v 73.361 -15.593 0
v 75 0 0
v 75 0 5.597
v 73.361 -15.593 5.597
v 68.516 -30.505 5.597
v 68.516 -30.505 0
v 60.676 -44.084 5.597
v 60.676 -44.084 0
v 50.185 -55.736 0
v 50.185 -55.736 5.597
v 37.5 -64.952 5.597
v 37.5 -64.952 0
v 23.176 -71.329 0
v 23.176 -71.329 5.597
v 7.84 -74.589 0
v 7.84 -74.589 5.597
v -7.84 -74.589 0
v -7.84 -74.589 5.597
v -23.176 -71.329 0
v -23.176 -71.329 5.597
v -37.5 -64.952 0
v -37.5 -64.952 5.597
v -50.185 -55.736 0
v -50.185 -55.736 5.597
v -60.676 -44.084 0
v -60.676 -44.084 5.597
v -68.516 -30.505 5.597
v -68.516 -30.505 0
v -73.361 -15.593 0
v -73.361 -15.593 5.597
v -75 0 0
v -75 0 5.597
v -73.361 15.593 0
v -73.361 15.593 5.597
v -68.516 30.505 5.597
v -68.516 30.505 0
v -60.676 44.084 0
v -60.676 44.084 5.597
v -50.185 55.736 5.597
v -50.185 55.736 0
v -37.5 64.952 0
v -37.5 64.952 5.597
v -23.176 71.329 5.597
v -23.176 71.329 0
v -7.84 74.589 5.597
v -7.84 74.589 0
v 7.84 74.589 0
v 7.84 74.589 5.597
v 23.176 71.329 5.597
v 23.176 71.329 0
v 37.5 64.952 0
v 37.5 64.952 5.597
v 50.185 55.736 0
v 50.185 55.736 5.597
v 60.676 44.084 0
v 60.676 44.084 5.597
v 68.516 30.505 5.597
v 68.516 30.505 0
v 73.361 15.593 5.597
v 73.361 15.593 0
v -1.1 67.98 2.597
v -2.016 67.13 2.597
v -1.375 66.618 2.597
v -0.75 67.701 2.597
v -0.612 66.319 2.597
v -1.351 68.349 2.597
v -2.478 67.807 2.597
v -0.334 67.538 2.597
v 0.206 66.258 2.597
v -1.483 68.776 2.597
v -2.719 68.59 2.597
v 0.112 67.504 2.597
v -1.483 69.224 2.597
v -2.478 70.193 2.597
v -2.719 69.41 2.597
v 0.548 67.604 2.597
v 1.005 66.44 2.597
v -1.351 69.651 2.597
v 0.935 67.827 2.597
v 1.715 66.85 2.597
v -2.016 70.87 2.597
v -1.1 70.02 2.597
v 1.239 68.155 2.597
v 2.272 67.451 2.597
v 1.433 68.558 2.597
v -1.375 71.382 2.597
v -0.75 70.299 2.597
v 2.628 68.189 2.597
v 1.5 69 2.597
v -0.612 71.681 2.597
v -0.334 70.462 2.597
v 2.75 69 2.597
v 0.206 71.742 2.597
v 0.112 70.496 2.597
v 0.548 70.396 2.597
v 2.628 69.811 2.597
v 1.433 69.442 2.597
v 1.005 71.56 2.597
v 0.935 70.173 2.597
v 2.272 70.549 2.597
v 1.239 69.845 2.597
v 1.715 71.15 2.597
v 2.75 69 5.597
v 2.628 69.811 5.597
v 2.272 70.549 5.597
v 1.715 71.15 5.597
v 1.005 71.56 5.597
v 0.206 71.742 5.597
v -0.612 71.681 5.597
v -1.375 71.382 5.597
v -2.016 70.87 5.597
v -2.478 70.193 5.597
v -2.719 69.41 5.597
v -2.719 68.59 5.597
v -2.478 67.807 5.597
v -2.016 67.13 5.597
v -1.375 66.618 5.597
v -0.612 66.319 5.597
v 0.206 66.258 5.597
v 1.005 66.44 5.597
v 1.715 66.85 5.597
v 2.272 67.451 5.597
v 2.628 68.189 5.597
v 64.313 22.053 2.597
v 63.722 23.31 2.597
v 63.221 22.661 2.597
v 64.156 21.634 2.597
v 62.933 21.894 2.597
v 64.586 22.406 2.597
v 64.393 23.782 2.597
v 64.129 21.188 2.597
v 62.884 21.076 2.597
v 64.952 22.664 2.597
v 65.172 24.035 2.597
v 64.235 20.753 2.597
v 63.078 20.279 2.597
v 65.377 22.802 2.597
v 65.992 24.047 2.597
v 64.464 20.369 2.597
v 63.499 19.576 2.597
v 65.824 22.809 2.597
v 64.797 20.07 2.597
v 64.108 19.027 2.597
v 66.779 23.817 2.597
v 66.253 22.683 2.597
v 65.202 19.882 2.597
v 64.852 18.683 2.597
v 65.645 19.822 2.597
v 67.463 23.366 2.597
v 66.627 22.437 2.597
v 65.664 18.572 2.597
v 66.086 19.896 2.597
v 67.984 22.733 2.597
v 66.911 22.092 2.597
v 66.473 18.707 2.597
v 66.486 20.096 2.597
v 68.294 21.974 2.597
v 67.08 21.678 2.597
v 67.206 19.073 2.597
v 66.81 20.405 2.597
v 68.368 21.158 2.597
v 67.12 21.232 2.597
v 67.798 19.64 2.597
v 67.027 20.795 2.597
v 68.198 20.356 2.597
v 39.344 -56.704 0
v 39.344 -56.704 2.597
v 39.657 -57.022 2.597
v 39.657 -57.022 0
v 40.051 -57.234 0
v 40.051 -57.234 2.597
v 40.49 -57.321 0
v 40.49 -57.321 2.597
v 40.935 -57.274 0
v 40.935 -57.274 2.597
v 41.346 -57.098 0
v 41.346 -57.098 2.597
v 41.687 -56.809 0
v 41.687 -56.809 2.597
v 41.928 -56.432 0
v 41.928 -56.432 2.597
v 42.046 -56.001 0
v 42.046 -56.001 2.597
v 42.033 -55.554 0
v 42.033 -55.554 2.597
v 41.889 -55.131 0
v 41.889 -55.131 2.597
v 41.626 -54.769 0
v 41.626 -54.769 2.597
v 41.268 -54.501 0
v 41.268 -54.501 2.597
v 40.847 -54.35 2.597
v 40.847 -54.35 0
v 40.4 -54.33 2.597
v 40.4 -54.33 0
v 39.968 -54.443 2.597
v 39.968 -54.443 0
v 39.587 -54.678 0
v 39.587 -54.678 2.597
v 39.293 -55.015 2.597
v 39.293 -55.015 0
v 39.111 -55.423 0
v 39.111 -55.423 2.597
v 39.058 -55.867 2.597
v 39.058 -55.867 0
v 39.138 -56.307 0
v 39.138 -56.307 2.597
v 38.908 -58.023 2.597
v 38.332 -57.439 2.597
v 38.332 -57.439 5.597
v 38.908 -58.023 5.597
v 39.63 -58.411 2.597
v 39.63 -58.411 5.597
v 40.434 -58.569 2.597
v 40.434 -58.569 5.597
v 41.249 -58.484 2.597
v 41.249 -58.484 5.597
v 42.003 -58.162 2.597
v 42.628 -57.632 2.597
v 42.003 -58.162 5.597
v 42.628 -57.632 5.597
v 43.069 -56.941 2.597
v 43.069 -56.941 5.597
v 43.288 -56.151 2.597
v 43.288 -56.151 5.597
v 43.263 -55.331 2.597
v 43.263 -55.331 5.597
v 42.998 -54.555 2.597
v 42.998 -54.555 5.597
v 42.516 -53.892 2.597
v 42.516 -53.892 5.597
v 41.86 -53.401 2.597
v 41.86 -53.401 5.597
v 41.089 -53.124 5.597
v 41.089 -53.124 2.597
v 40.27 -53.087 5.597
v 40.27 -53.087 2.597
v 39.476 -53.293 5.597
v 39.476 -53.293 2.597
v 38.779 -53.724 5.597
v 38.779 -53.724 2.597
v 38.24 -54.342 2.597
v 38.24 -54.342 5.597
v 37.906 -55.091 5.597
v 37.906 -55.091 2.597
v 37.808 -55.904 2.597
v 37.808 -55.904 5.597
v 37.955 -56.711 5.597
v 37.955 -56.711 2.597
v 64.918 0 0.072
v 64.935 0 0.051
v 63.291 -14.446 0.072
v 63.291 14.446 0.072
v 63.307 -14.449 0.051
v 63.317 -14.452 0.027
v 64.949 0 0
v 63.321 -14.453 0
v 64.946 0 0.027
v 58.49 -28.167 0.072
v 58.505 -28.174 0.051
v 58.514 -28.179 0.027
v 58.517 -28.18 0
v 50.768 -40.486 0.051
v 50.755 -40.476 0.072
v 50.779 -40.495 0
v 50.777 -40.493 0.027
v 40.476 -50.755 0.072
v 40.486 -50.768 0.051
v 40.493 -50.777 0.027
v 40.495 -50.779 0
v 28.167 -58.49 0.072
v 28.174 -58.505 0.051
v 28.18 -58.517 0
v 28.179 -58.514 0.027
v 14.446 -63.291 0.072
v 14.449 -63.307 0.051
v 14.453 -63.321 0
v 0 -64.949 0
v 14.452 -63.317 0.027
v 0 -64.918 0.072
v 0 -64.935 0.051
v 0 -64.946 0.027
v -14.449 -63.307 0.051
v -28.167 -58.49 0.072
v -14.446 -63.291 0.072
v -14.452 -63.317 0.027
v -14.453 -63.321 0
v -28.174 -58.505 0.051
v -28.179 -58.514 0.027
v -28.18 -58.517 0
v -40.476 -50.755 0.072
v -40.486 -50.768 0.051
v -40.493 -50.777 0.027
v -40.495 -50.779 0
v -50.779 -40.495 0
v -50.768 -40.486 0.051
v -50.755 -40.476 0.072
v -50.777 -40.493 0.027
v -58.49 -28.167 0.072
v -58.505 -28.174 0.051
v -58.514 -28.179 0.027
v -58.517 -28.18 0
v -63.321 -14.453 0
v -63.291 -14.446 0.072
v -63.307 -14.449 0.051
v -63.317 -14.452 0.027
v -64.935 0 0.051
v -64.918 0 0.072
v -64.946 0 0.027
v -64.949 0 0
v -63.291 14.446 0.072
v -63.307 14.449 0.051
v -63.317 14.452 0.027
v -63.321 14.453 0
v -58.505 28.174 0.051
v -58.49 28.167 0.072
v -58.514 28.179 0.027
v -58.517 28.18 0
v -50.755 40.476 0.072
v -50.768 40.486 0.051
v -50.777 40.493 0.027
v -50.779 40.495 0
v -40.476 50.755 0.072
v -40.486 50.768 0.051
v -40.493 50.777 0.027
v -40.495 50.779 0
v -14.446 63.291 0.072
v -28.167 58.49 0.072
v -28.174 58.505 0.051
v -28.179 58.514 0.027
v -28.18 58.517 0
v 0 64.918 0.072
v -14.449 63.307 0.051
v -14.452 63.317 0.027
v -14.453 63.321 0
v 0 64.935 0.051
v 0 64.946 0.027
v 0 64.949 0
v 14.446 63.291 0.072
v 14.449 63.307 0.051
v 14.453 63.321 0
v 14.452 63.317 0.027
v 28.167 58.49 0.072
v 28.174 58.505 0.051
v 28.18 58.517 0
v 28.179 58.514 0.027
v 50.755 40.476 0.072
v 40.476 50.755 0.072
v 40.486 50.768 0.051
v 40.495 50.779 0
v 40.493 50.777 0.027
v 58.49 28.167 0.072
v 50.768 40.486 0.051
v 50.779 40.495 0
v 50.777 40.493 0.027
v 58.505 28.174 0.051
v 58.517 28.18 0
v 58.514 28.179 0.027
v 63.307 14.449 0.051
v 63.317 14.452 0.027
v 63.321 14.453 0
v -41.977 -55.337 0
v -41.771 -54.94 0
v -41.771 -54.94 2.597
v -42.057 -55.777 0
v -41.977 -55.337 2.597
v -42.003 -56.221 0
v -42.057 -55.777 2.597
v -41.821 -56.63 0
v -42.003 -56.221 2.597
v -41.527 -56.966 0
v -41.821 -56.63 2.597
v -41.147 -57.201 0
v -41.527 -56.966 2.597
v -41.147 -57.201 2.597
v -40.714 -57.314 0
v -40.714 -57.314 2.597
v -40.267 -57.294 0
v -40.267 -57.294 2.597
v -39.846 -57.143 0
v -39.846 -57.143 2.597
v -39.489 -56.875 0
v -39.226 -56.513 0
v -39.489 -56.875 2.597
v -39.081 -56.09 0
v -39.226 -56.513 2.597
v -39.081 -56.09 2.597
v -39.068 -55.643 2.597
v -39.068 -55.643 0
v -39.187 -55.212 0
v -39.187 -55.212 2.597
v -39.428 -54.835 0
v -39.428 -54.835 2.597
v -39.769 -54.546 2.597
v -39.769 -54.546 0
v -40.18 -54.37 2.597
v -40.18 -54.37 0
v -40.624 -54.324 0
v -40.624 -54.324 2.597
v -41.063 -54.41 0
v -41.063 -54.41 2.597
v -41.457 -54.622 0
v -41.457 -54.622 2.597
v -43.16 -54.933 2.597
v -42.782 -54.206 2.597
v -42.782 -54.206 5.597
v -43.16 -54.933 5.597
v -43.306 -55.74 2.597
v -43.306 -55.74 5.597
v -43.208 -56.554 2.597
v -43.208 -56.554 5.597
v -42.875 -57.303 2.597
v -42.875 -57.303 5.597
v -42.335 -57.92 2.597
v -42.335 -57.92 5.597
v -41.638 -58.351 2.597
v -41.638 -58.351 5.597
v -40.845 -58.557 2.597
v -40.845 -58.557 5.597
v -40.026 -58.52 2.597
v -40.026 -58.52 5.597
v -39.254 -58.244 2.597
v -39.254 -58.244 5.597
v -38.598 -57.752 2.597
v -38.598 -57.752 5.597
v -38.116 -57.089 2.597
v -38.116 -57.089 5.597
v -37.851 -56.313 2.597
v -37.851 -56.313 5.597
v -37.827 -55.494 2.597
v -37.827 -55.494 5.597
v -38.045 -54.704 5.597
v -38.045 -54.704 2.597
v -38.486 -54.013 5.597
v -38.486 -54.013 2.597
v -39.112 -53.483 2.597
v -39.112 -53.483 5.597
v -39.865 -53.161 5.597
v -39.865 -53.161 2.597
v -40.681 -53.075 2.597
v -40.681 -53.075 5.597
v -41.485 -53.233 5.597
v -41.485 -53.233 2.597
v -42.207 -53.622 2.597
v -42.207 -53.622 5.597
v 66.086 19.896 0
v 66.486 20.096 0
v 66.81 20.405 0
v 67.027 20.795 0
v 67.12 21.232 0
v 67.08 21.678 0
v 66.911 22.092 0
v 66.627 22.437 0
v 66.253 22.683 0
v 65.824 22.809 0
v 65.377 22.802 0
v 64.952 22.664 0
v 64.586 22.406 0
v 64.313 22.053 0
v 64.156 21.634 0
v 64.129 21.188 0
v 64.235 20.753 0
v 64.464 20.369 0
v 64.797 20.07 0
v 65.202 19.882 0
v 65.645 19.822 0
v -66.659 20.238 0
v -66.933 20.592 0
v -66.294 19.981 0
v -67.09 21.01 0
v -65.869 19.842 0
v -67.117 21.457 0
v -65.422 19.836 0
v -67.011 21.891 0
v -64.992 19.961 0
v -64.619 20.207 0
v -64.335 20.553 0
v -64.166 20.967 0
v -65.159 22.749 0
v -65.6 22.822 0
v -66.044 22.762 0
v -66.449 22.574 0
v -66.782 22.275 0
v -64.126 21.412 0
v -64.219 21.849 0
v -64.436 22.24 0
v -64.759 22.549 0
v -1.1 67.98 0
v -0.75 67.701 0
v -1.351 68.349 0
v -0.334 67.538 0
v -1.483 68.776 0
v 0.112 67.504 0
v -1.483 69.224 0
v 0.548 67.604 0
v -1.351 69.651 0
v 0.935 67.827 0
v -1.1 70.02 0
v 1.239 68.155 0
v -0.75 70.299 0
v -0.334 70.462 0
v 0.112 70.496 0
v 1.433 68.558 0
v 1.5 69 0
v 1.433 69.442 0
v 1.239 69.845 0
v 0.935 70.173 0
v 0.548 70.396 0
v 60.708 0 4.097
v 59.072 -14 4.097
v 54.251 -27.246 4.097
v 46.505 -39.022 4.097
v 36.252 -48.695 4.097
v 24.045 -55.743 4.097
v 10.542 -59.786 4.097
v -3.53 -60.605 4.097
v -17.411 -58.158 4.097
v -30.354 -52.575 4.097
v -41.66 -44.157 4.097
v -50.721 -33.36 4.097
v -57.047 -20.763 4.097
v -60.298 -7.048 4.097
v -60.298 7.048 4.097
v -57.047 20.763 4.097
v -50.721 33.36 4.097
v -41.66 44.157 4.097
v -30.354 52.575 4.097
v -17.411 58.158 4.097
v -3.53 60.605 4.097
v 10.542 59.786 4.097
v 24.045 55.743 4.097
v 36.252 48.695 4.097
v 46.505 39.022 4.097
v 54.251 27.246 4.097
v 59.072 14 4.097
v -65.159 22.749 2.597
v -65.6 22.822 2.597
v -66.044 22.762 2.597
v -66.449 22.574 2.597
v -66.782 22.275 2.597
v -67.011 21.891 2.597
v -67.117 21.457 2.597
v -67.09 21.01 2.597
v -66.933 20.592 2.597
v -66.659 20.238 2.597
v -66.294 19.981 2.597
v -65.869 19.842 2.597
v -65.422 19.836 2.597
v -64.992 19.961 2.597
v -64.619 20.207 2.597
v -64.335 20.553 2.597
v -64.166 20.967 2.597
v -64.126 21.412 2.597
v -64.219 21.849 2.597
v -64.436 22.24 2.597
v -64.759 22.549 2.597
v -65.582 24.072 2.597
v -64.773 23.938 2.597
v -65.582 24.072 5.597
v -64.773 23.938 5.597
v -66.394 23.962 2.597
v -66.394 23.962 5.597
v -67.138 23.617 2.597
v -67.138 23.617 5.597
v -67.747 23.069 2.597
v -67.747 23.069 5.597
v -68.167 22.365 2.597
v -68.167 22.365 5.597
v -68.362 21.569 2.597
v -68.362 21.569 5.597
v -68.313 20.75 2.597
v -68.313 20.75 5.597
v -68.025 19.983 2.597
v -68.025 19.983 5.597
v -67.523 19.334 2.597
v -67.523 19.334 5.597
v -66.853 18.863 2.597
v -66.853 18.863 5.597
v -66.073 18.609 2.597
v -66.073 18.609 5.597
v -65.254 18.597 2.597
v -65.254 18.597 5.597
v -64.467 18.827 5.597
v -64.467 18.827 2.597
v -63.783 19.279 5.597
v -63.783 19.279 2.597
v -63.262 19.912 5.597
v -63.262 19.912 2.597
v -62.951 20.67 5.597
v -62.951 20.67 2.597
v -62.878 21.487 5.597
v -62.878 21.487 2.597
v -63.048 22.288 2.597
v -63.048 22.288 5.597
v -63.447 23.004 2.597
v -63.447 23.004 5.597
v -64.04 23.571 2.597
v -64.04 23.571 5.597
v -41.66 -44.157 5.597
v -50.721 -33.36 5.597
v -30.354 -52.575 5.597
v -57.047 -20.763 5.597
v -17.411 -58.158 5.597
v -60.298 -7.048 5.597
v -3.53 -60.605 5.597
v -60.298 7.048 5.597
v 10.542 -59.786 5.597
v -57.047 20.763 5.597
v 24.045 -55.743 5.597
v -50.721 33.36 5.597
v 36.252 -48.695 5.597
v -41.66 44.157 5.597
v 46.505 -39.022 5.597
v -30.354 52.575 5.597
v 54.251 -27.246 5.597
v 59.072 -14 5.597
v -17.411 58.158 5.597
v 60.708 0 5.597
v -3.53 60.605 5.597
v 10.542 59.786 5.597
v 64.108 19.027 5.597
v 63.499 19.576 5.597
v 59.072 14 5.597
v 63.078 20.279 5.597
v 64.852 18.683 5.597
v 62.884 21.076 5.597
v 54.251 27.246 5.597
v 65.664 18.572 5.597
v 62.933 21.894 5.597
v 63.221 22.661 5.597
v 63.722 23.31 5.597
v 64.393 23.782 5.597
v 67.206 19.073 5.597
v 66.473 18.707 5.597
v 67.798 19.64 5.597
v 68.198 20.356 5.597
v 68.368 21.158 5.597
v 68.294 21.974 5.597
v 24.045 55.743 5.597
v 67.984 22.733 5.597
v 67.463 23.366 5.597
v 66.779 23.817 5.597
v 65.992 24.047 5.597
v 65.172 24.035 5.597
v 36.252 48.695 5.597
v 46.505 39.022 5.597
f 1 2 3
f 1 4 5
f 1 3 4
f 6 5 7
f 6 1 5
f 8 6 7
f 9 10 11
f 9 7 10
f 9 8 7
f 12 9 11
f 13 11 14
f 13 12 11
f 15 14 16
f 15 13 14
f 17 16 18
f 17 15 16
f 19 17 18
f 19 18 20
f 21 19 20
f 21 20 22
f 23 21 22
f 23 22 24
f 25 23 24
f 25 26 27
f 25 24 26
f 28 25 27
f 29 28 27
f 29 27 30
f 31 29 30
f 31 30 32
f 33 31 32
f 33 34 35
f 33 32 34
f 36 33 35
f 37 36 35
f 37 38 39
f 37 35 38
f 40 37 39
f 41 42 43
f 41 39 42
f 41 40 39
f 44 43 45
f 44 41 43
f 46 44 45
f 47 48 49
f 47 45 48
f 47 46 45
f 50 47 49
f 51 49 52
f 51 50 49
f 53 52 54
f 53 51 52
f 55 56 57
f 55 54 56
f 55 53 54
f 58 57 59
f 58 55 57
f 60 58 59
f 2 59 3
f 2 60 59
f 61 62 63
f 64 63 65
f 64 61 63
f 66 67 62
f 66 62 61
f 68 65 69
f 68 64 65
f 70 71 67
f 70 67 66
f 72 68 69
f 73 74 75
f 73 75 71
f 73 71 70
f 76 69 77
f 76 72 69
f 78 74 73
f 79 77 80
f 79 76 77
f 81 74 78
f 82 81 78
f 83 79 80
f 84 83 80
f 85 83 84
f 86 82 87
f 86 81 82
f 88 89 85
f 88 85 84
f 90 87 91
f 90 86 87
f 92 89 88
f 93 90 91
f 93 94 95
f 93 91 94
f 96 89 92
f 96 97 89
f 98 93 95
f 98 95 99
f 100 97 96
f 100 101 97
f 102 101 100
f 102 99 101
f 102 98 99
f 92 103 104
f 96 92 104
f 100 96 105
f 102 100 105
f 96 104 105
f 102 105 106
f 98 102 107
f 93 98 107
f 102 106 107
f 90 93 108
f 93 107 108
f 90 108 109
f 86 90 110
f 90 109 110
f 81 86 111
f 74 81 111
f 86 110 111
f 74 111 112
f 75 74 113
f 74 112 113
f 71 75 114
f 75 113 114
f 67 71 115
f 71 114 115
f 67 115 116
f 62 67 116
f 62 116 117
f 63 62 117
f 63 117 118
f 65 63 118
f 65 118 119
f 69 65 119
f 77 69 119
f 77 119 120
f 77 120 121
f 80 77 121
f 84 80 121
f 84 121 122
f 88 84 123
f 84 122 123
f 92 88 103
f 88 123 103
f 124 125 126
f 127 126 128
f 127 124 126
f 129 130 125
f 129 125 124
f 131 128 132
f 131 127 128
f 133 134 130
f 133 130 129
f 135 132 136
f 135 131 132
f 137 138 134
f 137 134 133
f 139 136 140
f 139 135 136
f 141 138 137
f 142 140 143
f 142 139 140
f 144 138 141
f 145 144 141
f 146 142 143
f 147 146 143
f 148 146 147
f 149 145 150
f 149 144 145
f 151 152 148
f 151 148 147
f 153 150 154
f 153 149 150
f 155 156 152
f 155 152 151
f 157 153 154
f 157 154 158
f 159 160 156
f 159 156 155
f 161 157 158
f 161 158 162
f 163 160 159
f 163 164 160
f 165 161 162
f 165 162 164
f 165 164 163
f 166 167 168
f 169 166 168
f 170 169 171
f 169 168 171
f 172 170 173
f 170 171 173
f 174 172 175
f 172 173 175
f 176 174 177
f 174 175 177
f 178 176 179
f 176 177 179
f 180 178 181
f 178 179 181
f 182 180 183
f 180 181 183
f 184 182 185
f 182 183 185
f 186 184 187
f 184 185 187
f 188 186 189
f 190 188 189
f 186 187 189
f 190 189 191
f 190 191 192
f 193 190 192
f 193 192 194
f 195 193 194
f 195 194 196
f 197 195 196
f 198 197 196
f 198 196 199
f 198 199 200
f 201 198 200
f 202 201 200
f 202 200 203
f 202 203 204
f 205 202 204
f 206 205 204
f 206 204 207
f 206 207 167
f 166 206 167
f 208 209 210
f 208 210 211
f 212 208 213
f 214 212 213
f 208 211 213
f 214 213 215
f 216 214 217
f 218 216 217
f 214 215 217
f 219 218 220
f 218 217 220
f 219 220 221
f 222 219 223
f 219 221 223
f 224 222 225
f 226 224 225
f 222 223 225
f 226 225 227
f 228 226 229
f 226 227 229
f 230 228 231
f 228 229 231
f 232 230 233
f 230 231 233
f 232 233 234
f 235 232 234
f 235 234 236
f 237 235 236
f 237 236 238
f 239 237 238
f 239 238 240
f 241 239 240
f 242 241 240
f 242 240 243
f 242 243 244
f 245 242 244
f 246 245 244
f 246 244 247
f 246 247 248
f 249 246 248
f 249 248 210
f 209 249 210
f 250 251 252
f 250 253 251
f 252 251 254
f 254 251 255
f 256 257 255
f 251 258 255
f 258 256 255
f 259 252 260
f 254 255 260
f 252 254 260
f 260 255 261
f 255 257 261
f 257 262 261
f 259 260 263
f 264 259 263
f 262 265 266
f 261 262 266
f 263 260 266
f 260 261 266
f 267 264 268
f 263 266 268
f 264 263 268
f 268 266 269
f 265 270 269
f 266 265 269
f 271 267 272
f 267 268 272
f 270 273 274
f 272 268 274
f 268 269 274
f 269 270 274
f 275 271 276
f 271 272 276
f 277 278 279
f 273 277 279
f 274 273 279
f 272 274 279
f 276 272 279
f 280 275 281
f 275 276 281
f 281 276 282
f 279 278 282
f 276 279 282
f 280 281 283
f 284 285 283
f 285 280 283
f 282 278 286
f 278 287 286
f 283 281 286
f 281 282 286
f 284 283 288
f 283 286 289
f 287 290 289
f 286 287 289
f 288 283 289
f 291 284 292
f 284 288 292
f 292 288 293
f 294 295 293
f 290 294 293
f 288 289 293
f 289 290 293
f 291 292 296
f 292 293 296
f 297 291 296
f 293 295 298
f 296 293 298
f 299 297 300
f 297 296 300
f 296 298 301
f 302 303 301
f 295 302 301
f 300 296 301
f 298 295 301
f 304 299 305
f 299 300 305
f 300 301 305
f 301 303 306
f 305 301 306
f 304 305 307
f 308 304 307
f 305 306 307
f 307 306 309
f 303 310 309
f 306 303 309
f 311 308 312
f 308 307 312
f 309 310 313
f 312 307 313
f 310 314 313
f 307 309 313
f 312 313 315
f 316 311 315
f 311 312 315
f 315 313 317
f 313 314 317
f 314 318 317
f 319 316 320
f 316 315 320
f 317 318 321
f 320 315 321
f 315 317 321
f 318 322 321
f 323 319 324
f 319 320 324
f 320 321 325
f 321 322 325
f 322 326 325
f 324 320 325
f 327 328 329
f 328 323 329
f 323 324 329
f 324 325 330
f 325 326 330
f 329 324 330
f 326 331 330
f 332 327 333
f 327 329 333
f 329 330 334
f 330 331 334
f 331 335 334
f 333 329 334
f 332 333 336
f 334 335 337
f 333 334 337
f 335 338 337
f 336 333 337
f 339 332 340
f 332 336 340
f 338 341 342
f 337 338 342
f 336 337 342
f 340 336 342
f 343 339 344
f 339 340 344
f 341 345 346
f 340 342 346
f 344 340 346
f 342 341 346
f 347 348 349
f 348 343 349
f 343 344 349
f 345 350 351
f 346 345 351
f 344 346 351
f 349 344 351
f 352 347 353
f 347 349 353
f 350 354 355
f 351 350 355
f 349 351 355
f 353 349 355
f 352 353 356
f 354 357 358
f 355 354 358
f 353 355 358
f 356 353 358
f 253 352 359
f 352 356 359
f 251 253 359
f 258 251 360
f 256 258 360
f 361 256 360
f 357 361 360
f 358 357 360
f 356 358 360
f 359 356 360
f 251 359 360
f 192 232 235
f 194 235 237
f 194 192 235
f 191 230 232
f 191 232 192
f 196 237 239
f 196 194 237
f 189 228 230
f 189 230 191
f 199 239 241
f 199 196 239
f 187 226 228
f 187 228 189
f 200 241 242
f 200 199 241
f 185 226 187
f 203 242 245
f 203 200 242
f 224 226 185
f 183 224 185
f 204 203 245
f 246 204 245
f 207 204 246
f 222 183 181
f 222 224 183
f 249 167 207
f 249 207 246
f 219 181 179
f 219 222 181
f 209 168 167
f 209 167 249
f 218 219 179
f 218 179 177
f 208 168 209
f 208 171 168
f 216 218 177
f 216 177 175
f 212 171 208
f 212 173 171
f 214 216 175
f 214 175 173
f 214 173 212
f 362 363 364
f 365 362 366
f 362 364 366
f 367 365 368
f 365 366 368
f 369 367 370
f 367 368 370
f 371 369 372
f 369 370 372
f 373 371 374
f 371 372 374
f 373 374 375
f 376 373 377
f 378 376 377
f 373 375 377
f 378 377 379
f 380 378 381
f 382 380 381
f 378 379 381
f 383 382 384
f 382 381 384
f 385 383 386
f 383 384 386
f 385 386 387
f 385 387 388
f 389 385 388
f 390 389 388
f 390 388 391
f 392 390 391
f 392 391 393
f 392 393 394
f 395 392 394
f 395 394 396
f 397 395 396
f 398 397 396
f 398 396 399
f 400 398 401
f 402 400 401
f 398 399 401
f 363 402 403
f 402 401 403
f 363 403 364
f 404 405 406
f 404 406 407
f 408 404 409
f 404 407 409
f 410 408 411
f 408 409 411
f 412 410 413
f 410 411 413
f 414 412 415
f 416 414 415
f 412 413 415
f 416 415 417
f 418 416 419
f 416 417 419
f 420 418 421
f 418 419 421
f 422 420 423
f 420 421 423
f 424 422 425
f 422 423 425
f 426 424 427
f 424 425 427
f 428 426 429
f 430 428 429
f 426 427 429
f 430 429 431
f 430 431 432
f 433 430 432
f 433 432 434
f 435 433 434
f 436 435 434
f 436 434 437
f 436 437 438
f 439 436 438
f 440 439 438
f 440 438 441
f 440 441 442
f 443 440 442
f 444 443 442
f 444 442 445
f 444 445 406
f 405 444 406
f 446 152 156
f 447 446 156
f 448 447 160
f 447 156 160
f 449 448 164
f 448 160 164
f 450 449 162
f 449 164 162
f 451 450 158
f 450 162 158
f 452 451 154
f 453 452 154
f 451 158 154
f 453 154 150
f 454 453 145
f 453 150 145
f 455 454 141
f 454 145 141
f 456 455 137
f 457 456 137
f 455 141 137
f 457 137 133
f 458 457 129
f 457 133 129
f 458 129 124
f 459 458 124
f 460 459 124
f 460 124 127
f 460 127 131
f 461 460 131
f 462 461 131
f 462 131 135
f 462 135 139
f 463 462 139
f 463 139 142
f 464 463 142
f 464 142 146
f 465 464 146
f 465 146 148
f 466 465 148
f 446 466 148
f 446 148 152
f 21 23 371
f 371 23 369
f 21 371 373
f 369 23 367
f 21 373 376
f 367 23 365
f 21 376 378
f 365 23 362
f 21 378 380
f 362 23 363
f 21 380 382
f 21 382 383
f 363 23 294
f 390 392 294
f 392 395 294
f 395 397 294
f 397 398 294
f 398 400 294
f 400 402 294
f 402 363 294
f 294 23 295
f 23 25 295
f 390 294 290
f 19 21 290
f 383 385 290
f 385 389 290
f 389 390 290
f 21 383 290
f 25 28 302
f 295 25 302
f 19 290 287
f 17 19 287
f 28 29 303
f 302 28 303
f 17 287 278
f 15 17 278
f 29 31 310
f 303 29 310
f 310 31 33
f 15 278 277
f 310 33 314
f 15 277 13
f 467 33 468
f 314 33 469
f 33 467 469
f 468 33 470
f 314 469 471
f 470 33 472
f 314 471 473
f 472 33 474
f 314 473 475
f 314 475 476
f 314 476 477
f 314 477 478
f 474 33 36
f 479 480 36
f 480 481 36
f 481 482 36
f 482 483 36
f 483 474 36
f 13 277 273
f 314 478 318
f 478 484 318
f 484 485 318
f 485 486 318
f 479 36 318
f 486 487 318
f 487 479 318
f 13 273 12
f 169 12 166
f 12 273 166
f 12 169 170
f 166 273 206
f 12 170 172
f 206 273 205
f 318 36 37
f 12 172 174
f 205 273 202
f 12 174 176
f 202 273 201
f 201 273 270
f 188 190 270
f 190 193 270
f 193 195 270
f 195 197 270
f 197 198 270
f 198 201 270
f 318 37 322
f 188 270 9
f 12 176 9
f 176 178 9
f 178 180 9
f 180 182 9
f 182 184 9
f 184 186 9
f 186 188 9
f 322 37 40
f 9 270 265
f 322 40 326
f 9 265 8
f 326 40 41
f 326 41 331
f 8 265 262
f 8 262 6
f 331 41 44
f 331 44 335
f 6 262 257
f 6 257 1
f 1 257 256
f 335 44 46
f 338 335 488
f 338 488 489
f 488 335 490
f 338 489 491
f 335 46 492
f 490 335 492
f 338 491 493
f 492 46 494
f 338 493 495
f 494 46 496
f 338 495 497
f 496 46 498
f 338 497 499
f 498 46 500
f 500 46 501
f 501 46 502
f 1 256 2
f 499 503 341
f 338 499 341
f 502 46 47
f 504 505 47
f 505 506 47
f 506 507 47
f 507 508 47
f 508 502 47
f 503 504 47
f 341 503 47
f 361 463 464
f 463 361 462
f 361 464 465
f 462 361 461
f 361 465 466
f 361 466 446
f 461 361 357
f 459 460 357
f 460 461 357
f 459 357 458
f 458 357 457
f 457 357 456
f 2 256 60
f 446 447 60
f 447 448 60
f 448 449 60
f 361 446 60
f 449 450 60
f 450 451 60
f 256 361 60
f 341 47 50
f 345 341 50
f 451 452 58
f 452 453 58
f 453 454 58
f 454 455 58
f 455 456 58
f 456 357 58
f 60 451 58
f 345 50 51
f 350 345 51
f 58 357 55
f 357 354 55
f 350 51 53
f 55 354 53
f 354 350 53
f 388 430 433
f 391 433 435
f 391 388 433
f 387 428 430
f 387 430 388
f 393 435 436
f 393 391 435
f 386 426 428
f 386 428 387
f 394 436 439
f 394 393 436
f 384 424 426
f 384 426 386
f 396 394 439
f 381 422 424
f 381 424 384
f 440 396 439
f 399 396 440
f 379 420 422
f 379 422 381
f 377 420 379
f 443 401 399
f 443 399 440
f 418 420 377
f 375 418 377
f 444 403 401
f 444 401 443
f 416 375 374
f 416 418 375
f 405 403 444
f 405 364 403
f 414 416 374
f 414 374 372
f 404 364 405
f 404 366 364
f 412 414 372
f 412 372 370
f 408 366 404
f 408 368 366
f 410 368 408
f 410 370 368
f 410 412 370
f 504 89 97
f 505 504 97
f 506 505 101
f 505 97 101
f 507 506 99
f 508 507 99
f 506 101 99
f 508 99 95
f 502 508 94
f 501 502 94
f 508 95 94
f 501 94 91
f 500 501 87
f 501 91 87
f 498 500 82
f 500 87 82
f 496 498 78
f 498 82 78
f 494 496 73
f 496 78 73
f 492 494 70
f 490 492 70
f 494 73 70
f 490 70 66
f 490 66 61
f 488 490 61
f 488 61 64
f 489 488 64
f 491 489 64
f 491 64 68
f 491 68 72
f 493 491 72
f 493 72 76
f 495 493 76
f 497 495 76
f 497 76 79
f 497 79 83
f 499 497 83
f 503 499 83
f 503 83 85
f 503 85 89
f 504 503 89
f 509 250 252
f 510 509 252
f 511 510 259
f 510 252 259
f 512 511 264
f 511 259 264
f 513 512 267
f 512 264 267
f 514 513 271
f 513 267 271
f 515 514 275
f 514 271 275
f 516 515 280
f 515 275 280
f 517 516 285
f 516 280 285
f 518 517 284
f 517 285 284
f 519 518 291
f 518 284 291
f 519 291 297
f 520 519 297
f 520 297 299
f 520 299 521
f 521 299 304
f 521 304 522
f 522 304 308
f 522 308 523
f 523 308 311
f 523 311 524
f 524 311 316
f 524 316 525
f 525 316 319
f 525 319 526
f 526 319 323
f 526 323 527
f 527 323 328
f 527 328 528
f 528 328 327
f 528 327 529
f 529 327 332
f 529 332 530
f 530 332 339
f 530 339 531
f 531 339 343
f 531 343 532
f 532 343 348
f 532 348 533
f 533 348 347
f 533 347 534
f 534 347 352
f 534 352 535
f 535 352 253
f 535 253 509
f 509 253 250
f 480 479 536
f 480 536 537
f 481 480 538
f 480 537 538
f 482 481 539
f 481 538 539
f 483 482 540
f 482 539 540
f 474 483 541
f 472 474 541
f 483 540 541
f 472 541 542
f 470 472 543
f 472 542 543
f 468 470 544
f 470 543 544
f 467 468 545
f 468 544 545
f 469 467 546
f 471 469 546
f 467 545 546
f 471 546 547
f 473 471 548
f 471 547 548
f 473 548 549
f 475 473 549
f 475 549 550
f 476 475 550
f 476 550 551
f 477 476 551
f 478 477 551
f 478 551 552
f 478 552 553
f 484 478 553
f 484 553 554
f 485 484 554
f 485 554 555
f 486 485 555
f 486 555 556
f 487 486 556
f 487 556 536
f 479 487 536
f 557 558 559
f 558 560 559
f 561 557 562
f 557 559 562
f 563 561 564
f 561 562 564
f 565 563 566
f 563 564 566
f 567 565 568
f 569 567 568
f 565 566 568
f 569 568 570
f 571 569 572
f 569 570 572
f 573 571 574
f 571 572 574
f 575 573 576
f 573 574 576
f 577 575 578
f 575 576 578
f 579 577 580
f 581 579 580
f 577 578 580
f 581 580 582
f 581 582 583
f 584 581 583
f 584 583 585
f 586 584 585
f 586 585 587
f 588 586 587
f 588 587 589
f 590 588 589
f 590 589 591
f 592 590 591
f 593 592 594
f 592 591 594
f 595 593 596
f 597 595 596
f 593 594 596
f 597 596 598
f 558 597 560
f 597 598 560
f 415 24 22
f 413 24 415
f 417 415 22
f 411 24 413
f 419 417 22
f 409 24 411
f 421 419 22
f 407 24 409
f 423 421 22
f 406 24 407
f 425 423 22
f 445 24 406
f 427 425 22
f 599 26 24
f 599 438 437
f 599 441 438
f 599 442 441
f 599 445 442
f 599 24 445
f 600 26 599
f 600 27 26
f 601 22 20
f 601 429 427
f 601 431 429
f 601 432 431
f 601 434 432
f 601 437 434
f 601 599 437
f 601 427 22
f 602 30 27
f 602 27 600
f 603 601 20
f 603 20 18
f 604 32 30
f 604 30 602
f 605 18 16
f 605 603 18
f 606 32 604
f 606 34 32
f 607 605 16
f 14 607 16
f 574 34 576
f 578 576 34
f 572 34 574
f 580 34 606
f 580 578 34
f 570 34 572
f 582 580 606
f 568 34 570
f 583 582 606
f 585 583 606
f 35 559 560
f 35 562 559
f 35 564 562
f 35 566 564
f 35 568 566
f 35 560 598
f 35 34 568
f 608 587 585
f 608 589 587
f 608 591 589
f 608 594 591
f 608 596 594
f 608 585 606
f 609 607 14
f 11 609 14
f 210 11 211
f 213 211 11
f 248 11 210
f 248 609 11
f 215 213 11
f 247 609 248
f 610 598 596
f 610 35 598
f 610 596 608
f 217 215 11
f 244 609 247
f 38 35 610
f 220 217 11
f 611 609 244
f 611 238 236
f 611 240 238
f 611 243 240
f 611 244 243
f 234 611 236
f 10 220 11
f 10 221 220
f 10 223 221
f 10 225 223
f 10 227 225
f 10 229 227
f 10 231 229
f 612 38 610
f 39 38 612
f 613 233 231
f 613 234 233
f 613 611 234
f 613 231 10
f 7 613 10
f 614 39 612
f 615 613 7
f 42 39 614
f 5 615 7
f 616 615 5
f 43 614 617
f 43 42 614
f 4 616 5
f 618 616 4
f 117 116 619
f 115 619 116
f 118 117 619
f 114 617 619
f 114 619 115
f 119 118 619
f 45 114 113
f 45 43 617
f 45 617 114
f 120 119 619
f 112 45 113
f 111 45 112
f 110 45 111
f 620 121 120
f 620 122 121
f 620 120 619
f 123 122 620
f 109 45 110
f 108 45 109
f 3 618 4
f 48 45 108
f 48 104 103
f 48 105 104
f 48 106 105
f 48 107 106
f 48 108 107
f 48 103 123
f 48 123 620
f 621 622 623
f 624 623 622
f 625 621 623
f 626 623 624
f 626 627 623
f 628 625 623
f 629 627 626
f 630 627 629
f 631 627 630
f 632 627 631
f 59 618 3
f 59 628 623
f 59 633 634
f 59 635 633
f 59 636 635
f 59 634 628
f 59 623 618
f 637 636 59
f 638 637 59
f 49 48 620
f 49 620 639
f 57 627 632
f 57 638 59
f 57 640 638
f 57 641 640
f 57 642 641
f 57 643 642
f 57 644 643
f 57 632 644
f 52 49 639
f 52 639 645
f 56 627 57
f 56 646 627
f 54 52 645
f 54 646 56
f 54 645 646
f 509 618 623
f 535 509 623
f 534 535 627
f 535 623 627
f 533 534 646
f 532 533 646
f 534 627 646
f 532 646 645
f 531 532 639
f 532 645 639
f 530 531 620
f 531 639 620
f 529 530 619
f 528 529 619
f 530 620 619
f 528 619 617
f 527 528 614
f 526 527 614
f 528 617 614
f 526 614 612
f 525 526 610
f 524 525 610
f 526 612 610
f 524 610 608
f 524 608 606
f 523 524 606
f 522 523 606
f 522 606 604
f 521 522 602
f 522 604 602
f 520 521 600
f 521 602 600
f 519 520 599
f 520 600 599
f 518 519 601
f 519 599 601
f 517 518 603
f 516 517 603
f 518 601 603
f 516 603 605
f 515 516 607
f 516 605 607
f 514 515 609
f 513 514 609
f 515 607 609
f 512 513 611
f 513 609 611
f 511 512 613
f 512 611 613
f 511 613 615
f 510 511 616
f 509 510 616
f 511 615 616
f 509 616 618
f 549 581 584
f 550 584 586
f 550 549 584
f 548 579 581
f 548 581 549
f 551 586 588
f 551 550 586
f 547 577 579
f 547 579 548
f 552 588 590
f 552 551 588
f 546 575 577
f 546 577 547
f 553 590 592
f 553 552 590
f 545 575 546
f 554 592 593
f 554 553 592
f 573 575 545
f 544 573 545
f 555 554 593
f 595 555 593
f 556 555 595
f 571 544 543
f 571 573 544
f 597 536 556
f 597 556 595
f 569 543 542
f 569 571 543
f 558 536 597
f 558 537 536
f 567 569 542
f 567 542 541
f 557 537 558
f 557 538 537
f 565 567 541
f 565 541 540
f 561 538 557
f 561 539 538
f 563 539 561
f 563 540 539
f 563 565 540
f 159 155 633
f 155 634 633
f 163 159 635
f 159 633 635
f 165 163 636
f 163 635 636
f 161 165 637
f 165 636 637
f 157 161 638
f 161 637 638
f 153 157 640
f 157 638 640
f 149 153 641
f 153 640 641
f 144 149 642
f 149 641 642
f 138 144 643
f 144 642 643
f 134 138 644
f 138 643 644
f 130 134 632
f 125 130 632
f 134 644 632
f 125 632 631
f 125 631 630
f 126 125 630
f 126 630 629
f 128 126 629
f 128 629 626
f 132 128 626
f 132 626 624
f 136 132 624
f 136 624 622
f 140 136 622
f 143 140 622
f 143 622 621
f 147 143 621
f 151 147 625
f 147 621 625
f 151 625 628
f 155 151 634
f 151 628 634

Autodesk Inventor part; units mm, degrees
ref_plane "YZ Plane" through (0, 0, 0) normal (1, 0, 0) x (0, 1, 0)
ref_plane "XZ Plane" through (0, 0, 0) normal (0, 1, 0) x (-1, 0, 0)
sketch "Sketch7" plane through (0, 0, 0) normal (0, 1, 0) x (-1, 0, 0)
  line L0 (0, 0) -> (0, 61.9844)
  line L1 (0, 0) -> (-59.2469, 0) construction
  line L2 (0, 61.9844) -> (-59.2469, 0) construction
  line L3 (0, 61.9844) -> (-64.8494, 0) construction
  line L4 (0, 61.9844) -> (-58.9939, -5.5968) construction
  line L5 (0, 0) -> (0, -61.9844)
  line L6 (0, -61.9844) -> (-59.2469, 0) construction
  line L7 (0, -61.9844) -> (-64.8494, 0) construction
  line L8 (0, -61.9844) -> (-58.9939, 5.5968) construction
  line L9 (-58.9939, 5.5968) -> (-64.8494, 0) construction
  line L10 (-54.1083, 0) -> (-62.8579, -8.363) construction
  line L11 (-54.1083, 0) -> (-38.773, -14.6578) construction
  line L12 (0, -94.3812) -> (0, 132.3969) projected
  line L13 (-75, -5.9919) -> (-75, 6.008)
  line L14 (105, 0) -> (-105, 0) projected
  line L15 (-62.0481, 2.6775) -> (-56.4456, -2.6775) construction
  line L16 (-56.4456, 2.6775) -> (-62.0481, -2.6775) construction
  line L17 (-26.151, -15.9303) -> (-40.3783, -15.9303) construction
  line L18 (-40.3783, -15.9303) -> (-40.3783, -12.7539) construction
  line L19 (-40.3783, -12.7539) -> (-26.151, -12.7539) construction
  line L20 (-26.151, -12.7539) -> (-26.151, -15.9303) construction
  point P0 (-75, 0)
  dimension "Roller_Side_difference" = -0.0002
  dimension "d90" = 61.9844
  dimension "d201" = 75
  dimension "d343" = 92.587
  dimension "d344" = 92.588
  dimension "d367" = 8.1
sketch "Sketch1" plane through (0, 0, 0) normal (0, 0, 1) x (1, 0, 0)
  circle A0 centre (0, 0) radius 59.2469 construction
  line L0 (0, 0) -> (59.2469, 0)
  line L1 (0, 0) -> (59.2469, 4.025)
  line L2 (59.2469, 0) -> (59.2469, 4.025)
  circle A1 centre (0, 0) radius 75
  point P0 (56.8, 0)
  dimension "d56" = 59.2469
  dimension "d57" = 4.025
  dimension "d400" = 75
  dimension "d495" = 2.5
  dimension "d496" = 8
  dimension "d531" = 5.5
  dimension "d532" = 5.5
  dimension "d533" = 5.5
  dimension "d537" = 24.5
  dimension "d538" = 3
  dimension "d543" = 5.5
  dimension "d549" = 3
  dimension "d550" = 3
  dimension "d567" = 5.5
  dimension "d568" = 5.5
sketch "Roller1" plane through (0, 0, 0) normal (0, 1, 0) x (-1, 0, 0)
  line L0 (0, 61.9844) -> (-58.9939, -5.5968) construction
  line L1 (0, 61.9844) -> (-64.8494, 0) construction
  line L2 (-54.1083, 0) -> (-38.773, -14.6578) construction
  line L3 (0, -61.9844) -> (-64.8494, 0) construction
  line L4 (-54.0606, 0.0927) -> (-58.9462, -5.5041)
  line L5 (-58.9462, -5.5041) -> (-64.7589, 0.0519)
  line L6 (-64.7589, 0.0519) -> (-59.3884, 5.1851)
  line L7 (-59.3884, 5.1851) -> (-54.0606, 0.0927)
  line L8 (-56.0019, 1.9482) -> (-61.1299, -3.4168)
  line L9 (-61.8526, -2.7261) -> (-56.7246, 2.639)
  point P0 (0, 0)
  dimension "d345" = 0.025
  dimension "d346" = 0.025
  dimension "d347" = 0.1
  dimension "d348" = 0.1
  dimension "d349" = 272.588
  dimension "d350" = 272.587
  dimension "d617" = 0.9997
sketch "Roller2" plane through (0, 0, 0) normal (0, 1, 0) x (-1, 0, 0)
  line L0 (0, -61.9844) -> (-58.9939, 5.5968) construction
  line L1 (-54.1083, 0) -> (-62.8579, -8.363) construction
  line L2 (0, -61.9844) -> (-64.8494, 0) construction
  line L3 (0, 61.9844) -> (-64.8494, 0) construction
  line L4 (-58.9462, 5.5041) -> (-54.1923, 0.0581)
  line L5 (-54.1923, 0.0581) -> (-59.5331, -5.0468)
  line L6 (-59.5331, -5.0468) -> (-64.7589, -0.0519)
  line L7 (-64.7589, -0.0519) -> (-58.9462, 5.5041)
  line L8 (-61.8526, 2.7261) -> (-56.8627, -2.4944)
  line L9 (-61.1297, 3.417) -> (-56.1399, -1.8034)
  point P0 (0, 0)
  dimension "d351" = 0.025
  dimension "d352" = 0.025
  dimension "d354" = 0.1
  dimension "d355" = 92.587
  dimension "d356" = 92.588
  dimension "d370" = 0.1
  dimension "d371" = 1
sketch "Sketch22" plane through (0, 0, 0) normal (0, 1, 0) x (-1, 0, 0)
  line L0 (-31.756, 8.0215) -> (-17.5287, 8.0215) construction
  line L1 (-17.5287, 8.0215) -> (-17.5287, 4.8451) construction
  line L2 (-17.5287, 4.8451) -> (-31.756, 4.8451) construction
  line L3 (-31.756, 4.8451) -> (-31.756, 8.0215) construction
  point P0 (0, 0)
  dimension "Roller_Side_difference" = -0.0002
sketch "Sketch2" plane through (0, 0, 0) normal (0, 1, 0) x (-1, 0, 0)
  line L0 (0, 0) -> (0, 59.2469) construction
  line L1 (0, 0) -> (-59.2469, 0) projected
  line L2 (0, 0) -> (0, -59.2469)
  line L3 (0, -59.2469) -> (-59.2469, 0) construction
  line L4 (0, 59.2469) -> (-59.2469, 0) construction
  line L5 (-50.488, 53.5552) -> (0, 59.2469) construction
  line L6 (-29.7354, 7.189) -> (0, 59.2469) construction
  line L7 (-29.7354, 7.189) -> (0, -59.2469) construction
  line L8 (-48.8381, -26.254) -> (0, -59.2469) construction
  point P0 (-40.4258, 18.8211)
sketch "Sketch23" plane through (0, 0, 0) normal (0, 1, 0) x (-1, 0, 0)
  line L0 (0, -61.9844) -> (-58.9939, 5.5968) construction
  line L1 (0, -61.9844) -> (-64.8494, 0) construction
  line L2 (0, 61.9844) -> (-58.9939, -5.5968) construction
  line L3 (-58.9939, 5.5968) -> (-64.8494, 0) construction
  line L4 (0, 61.9844) -> (-64.8494, 0) construction
  line L5 (-58.9939, 5.5968) -> (-58.9939, -5.5968) construction
  line L6 (105, 0) -> (-105, 0) projected
  line L7 (-57.5518, 4.0968) -> (-54.033, 0.0658)
  line L8 (-54.033, -0.0658) -> (-57.5518, -4.0968)
  line L9 (-60.708, 4.0968) -> (-64.9185, 0.0723)
  line L10 (-64.9185, -0.0723) -> (-60.708, -4.0968)
  arc A0 (-64.9185, 0.0723) -> (-64.9185, -0.0723) centre (-64.8494, 0) ccw
  arc A1 (-54.033, -0.0658) -> (-54.033, 0.0658) centre (-54.1083, 0) ccw
  line L11 (-57.5518, 4.0968) -> (-57.5518, 5.5968)
  line L12 (-57.5518, 5.5968) -> (-50, 5.5968)
  line L13 (-50, 5.5968) -> (-50, -5.5968)
  line L14 (-50, -5.5968) -> (-57.5518, -5.5968)
  line L15 (-57.5518, -5.5968) -> (-57.5518, -4.0968)
  line L16 (-60.708, 4.0968) -> (-60.708, 5.5968)
  line L17 (-60.708, 5.5968) -> (-75, 5.5968)
  line L18 (-75, 5.5968) -> (-75, -5.5968)
  line L19 (-60.708, -4.0968) -> (-60.708, -5.5968)
  line L20 (-60.708, -5.5968) -> (-75, -5.5968)
  line L21 (-58.9939, 5.5968) -> (-58.9939, 5.5968)
  line L22 (-58.9939, -5.5968) -> (-58.9939, -5.5968)
  line L23 (0, -94.3812) -> (0, 132.3969) projected
  line L24 (-64.9941, 0) -> (-75, 0)
  point P0 (0, 0)
  point P1 (-53.9756, 0)
  point P2 (-64.9494, 0)
  point P3 (-75, 0)
  dimension "d378" = 90
  dimension "d379" = 0.1
  dimension "d380" = 0.1
  dimension "d381" = 0.1
  dimension "d382" = 0.1
  dimension "d383" = 0.1
  dimension "d384" = 11.1935
  dimension "d385" = 0
  dimension "d386" = 0
  dimension "d391" = 50
  dimension "d392" = 75
  dimension "d393" = 1.5
  dimension "d394" = 1.5
  dimension "d395" = 1.5
  dimension "d396" = 1.5
revolve "RevRoller1" [suppressed]
fillet "Fillet1" [suppressed]
sketch "Sketch40" plane through (0, 0, -5.231) normal (0, 0, -1) x (-1, 0, 0)
  circle A0 centre (53.5, 0) radius 2.75 projected
  circle A1 centre (0, 0) radius 53.5 projected
  point P0 (53.4293, 2.7491)
  point P1 (53.4293, -2.7491)
  dimension "d585" = 8
  dimension "d587" = 1.75
  dimension "d589" = 3
  dimension "d592" = 2
  dimension "d593" = 12
  dimension "d594" = 12
  dimension "d611" = 360
pattern_circular "Circular Pattern13" [suppressed]
feature "Move Body7" [suppressed]
revolve "Revolution13" [suppressed]
fillet "Fillet3" [suppressed]
pattern_circular "Circular Pattern14" [suppressed]
feature "Move Body6" [suppressed]
revolve "Revolution14" [suppressed]
revolve "OuterRim_Top2" [suppressed]
revolve "OuterRim_Bottom2" add sketch "Sketch23" angle 360 about axis through (0, 0, -10) along (0, 0, 1) contours L6 L18 L17 L16 L9 A0
ref_plane "Work Plane7" through (0, 0, 100) normal (0, 0, 1) x (1, 0, 0)
sketch "Sketch47" plane through (0, 0, 100) normal (0, 0, 1) x (1, 0, 0)
  circle A0 centre (0, 0) radius 75 construction
  circle A1 centre (0, 0) radius 60.708 construction
  circle A2 centre (0, 0) radius 57.5518 construction
  circle A3 centre (0, 0) radius 50 construction
  circle A4 centre (0, 0) radius 69
  point P0 (0, 69)
  dimension "d620" = 69
sketch "Sketch48" plane through (0, 0, 5.5968) normal (0, 0, 1) x (1, 0, 0)
  circle A0 centre (0, 69) radius 2.75
  circle A1 centre (0, 69) radius 1.5
  circle A2 centre (0, 0) radius 69 construction
  dimension "d621" = 3
  dimension "d622" = 5.5
extrude "Extrusion39" cut sketch "Sketch48" against normal blind 5.5968 contours A1
extrude "Extrusion40" cut sketch "Sketch48" against normal blind 3 contours A0 | A1
pattern_circular "Circular Pattern28" count 5 over 360 about axis through (0, 0, 4.8468) along (0, 0, 1) of "Extrusion39", "Extrusion40"
sketch "Sketch49" plane through (0, 0, -5.5968) normal (0, 0, -1) x (-1, 0, 0)
  circle A0 centre (0, 0) radius 69 construction
  circle A1 centre (0, 69) radius 1.5
  line L0 (2.75, 67.4123) -> (0, 65.8246)
  line L1 (0, 65.8246) -> (-2.75, 67.4123)
  line L2 (-2.75, 67.4123) -> (-2.75, 70.5877)
  line L3 (-2.75, 70.5877) -> (0, 72.1754)
  line L4 (0, 72.1754) -> (2.75, 70.5877)
  line L5 (2.75, 70.5877) -> (2.75, 67.4123)
  dimension "d630" = 5.5
  dimension "d631" = 3
extrude "Extrusion41" [suppressed]
extrude "Extrusion42" [suppressed]
pattern_circular "Circular Pattern29" [suppressed]
equation "\"Roller_Side_difference\" = -0.000942deg"
equation "\"Cycloid_Top_Plate_Fasner_Inner\" = 61.25"
equation "\"Cycloid_Top_Plate_Fasner_Outer\" = 85.75"
equation "\"Roller_Hole_Radius\" = 1"
equation "\"Distance_To_Bearing\" = 85.74529"
equation "\"d514\" = 0.2"
properties part number "BottomOuterBearing_TBS"
